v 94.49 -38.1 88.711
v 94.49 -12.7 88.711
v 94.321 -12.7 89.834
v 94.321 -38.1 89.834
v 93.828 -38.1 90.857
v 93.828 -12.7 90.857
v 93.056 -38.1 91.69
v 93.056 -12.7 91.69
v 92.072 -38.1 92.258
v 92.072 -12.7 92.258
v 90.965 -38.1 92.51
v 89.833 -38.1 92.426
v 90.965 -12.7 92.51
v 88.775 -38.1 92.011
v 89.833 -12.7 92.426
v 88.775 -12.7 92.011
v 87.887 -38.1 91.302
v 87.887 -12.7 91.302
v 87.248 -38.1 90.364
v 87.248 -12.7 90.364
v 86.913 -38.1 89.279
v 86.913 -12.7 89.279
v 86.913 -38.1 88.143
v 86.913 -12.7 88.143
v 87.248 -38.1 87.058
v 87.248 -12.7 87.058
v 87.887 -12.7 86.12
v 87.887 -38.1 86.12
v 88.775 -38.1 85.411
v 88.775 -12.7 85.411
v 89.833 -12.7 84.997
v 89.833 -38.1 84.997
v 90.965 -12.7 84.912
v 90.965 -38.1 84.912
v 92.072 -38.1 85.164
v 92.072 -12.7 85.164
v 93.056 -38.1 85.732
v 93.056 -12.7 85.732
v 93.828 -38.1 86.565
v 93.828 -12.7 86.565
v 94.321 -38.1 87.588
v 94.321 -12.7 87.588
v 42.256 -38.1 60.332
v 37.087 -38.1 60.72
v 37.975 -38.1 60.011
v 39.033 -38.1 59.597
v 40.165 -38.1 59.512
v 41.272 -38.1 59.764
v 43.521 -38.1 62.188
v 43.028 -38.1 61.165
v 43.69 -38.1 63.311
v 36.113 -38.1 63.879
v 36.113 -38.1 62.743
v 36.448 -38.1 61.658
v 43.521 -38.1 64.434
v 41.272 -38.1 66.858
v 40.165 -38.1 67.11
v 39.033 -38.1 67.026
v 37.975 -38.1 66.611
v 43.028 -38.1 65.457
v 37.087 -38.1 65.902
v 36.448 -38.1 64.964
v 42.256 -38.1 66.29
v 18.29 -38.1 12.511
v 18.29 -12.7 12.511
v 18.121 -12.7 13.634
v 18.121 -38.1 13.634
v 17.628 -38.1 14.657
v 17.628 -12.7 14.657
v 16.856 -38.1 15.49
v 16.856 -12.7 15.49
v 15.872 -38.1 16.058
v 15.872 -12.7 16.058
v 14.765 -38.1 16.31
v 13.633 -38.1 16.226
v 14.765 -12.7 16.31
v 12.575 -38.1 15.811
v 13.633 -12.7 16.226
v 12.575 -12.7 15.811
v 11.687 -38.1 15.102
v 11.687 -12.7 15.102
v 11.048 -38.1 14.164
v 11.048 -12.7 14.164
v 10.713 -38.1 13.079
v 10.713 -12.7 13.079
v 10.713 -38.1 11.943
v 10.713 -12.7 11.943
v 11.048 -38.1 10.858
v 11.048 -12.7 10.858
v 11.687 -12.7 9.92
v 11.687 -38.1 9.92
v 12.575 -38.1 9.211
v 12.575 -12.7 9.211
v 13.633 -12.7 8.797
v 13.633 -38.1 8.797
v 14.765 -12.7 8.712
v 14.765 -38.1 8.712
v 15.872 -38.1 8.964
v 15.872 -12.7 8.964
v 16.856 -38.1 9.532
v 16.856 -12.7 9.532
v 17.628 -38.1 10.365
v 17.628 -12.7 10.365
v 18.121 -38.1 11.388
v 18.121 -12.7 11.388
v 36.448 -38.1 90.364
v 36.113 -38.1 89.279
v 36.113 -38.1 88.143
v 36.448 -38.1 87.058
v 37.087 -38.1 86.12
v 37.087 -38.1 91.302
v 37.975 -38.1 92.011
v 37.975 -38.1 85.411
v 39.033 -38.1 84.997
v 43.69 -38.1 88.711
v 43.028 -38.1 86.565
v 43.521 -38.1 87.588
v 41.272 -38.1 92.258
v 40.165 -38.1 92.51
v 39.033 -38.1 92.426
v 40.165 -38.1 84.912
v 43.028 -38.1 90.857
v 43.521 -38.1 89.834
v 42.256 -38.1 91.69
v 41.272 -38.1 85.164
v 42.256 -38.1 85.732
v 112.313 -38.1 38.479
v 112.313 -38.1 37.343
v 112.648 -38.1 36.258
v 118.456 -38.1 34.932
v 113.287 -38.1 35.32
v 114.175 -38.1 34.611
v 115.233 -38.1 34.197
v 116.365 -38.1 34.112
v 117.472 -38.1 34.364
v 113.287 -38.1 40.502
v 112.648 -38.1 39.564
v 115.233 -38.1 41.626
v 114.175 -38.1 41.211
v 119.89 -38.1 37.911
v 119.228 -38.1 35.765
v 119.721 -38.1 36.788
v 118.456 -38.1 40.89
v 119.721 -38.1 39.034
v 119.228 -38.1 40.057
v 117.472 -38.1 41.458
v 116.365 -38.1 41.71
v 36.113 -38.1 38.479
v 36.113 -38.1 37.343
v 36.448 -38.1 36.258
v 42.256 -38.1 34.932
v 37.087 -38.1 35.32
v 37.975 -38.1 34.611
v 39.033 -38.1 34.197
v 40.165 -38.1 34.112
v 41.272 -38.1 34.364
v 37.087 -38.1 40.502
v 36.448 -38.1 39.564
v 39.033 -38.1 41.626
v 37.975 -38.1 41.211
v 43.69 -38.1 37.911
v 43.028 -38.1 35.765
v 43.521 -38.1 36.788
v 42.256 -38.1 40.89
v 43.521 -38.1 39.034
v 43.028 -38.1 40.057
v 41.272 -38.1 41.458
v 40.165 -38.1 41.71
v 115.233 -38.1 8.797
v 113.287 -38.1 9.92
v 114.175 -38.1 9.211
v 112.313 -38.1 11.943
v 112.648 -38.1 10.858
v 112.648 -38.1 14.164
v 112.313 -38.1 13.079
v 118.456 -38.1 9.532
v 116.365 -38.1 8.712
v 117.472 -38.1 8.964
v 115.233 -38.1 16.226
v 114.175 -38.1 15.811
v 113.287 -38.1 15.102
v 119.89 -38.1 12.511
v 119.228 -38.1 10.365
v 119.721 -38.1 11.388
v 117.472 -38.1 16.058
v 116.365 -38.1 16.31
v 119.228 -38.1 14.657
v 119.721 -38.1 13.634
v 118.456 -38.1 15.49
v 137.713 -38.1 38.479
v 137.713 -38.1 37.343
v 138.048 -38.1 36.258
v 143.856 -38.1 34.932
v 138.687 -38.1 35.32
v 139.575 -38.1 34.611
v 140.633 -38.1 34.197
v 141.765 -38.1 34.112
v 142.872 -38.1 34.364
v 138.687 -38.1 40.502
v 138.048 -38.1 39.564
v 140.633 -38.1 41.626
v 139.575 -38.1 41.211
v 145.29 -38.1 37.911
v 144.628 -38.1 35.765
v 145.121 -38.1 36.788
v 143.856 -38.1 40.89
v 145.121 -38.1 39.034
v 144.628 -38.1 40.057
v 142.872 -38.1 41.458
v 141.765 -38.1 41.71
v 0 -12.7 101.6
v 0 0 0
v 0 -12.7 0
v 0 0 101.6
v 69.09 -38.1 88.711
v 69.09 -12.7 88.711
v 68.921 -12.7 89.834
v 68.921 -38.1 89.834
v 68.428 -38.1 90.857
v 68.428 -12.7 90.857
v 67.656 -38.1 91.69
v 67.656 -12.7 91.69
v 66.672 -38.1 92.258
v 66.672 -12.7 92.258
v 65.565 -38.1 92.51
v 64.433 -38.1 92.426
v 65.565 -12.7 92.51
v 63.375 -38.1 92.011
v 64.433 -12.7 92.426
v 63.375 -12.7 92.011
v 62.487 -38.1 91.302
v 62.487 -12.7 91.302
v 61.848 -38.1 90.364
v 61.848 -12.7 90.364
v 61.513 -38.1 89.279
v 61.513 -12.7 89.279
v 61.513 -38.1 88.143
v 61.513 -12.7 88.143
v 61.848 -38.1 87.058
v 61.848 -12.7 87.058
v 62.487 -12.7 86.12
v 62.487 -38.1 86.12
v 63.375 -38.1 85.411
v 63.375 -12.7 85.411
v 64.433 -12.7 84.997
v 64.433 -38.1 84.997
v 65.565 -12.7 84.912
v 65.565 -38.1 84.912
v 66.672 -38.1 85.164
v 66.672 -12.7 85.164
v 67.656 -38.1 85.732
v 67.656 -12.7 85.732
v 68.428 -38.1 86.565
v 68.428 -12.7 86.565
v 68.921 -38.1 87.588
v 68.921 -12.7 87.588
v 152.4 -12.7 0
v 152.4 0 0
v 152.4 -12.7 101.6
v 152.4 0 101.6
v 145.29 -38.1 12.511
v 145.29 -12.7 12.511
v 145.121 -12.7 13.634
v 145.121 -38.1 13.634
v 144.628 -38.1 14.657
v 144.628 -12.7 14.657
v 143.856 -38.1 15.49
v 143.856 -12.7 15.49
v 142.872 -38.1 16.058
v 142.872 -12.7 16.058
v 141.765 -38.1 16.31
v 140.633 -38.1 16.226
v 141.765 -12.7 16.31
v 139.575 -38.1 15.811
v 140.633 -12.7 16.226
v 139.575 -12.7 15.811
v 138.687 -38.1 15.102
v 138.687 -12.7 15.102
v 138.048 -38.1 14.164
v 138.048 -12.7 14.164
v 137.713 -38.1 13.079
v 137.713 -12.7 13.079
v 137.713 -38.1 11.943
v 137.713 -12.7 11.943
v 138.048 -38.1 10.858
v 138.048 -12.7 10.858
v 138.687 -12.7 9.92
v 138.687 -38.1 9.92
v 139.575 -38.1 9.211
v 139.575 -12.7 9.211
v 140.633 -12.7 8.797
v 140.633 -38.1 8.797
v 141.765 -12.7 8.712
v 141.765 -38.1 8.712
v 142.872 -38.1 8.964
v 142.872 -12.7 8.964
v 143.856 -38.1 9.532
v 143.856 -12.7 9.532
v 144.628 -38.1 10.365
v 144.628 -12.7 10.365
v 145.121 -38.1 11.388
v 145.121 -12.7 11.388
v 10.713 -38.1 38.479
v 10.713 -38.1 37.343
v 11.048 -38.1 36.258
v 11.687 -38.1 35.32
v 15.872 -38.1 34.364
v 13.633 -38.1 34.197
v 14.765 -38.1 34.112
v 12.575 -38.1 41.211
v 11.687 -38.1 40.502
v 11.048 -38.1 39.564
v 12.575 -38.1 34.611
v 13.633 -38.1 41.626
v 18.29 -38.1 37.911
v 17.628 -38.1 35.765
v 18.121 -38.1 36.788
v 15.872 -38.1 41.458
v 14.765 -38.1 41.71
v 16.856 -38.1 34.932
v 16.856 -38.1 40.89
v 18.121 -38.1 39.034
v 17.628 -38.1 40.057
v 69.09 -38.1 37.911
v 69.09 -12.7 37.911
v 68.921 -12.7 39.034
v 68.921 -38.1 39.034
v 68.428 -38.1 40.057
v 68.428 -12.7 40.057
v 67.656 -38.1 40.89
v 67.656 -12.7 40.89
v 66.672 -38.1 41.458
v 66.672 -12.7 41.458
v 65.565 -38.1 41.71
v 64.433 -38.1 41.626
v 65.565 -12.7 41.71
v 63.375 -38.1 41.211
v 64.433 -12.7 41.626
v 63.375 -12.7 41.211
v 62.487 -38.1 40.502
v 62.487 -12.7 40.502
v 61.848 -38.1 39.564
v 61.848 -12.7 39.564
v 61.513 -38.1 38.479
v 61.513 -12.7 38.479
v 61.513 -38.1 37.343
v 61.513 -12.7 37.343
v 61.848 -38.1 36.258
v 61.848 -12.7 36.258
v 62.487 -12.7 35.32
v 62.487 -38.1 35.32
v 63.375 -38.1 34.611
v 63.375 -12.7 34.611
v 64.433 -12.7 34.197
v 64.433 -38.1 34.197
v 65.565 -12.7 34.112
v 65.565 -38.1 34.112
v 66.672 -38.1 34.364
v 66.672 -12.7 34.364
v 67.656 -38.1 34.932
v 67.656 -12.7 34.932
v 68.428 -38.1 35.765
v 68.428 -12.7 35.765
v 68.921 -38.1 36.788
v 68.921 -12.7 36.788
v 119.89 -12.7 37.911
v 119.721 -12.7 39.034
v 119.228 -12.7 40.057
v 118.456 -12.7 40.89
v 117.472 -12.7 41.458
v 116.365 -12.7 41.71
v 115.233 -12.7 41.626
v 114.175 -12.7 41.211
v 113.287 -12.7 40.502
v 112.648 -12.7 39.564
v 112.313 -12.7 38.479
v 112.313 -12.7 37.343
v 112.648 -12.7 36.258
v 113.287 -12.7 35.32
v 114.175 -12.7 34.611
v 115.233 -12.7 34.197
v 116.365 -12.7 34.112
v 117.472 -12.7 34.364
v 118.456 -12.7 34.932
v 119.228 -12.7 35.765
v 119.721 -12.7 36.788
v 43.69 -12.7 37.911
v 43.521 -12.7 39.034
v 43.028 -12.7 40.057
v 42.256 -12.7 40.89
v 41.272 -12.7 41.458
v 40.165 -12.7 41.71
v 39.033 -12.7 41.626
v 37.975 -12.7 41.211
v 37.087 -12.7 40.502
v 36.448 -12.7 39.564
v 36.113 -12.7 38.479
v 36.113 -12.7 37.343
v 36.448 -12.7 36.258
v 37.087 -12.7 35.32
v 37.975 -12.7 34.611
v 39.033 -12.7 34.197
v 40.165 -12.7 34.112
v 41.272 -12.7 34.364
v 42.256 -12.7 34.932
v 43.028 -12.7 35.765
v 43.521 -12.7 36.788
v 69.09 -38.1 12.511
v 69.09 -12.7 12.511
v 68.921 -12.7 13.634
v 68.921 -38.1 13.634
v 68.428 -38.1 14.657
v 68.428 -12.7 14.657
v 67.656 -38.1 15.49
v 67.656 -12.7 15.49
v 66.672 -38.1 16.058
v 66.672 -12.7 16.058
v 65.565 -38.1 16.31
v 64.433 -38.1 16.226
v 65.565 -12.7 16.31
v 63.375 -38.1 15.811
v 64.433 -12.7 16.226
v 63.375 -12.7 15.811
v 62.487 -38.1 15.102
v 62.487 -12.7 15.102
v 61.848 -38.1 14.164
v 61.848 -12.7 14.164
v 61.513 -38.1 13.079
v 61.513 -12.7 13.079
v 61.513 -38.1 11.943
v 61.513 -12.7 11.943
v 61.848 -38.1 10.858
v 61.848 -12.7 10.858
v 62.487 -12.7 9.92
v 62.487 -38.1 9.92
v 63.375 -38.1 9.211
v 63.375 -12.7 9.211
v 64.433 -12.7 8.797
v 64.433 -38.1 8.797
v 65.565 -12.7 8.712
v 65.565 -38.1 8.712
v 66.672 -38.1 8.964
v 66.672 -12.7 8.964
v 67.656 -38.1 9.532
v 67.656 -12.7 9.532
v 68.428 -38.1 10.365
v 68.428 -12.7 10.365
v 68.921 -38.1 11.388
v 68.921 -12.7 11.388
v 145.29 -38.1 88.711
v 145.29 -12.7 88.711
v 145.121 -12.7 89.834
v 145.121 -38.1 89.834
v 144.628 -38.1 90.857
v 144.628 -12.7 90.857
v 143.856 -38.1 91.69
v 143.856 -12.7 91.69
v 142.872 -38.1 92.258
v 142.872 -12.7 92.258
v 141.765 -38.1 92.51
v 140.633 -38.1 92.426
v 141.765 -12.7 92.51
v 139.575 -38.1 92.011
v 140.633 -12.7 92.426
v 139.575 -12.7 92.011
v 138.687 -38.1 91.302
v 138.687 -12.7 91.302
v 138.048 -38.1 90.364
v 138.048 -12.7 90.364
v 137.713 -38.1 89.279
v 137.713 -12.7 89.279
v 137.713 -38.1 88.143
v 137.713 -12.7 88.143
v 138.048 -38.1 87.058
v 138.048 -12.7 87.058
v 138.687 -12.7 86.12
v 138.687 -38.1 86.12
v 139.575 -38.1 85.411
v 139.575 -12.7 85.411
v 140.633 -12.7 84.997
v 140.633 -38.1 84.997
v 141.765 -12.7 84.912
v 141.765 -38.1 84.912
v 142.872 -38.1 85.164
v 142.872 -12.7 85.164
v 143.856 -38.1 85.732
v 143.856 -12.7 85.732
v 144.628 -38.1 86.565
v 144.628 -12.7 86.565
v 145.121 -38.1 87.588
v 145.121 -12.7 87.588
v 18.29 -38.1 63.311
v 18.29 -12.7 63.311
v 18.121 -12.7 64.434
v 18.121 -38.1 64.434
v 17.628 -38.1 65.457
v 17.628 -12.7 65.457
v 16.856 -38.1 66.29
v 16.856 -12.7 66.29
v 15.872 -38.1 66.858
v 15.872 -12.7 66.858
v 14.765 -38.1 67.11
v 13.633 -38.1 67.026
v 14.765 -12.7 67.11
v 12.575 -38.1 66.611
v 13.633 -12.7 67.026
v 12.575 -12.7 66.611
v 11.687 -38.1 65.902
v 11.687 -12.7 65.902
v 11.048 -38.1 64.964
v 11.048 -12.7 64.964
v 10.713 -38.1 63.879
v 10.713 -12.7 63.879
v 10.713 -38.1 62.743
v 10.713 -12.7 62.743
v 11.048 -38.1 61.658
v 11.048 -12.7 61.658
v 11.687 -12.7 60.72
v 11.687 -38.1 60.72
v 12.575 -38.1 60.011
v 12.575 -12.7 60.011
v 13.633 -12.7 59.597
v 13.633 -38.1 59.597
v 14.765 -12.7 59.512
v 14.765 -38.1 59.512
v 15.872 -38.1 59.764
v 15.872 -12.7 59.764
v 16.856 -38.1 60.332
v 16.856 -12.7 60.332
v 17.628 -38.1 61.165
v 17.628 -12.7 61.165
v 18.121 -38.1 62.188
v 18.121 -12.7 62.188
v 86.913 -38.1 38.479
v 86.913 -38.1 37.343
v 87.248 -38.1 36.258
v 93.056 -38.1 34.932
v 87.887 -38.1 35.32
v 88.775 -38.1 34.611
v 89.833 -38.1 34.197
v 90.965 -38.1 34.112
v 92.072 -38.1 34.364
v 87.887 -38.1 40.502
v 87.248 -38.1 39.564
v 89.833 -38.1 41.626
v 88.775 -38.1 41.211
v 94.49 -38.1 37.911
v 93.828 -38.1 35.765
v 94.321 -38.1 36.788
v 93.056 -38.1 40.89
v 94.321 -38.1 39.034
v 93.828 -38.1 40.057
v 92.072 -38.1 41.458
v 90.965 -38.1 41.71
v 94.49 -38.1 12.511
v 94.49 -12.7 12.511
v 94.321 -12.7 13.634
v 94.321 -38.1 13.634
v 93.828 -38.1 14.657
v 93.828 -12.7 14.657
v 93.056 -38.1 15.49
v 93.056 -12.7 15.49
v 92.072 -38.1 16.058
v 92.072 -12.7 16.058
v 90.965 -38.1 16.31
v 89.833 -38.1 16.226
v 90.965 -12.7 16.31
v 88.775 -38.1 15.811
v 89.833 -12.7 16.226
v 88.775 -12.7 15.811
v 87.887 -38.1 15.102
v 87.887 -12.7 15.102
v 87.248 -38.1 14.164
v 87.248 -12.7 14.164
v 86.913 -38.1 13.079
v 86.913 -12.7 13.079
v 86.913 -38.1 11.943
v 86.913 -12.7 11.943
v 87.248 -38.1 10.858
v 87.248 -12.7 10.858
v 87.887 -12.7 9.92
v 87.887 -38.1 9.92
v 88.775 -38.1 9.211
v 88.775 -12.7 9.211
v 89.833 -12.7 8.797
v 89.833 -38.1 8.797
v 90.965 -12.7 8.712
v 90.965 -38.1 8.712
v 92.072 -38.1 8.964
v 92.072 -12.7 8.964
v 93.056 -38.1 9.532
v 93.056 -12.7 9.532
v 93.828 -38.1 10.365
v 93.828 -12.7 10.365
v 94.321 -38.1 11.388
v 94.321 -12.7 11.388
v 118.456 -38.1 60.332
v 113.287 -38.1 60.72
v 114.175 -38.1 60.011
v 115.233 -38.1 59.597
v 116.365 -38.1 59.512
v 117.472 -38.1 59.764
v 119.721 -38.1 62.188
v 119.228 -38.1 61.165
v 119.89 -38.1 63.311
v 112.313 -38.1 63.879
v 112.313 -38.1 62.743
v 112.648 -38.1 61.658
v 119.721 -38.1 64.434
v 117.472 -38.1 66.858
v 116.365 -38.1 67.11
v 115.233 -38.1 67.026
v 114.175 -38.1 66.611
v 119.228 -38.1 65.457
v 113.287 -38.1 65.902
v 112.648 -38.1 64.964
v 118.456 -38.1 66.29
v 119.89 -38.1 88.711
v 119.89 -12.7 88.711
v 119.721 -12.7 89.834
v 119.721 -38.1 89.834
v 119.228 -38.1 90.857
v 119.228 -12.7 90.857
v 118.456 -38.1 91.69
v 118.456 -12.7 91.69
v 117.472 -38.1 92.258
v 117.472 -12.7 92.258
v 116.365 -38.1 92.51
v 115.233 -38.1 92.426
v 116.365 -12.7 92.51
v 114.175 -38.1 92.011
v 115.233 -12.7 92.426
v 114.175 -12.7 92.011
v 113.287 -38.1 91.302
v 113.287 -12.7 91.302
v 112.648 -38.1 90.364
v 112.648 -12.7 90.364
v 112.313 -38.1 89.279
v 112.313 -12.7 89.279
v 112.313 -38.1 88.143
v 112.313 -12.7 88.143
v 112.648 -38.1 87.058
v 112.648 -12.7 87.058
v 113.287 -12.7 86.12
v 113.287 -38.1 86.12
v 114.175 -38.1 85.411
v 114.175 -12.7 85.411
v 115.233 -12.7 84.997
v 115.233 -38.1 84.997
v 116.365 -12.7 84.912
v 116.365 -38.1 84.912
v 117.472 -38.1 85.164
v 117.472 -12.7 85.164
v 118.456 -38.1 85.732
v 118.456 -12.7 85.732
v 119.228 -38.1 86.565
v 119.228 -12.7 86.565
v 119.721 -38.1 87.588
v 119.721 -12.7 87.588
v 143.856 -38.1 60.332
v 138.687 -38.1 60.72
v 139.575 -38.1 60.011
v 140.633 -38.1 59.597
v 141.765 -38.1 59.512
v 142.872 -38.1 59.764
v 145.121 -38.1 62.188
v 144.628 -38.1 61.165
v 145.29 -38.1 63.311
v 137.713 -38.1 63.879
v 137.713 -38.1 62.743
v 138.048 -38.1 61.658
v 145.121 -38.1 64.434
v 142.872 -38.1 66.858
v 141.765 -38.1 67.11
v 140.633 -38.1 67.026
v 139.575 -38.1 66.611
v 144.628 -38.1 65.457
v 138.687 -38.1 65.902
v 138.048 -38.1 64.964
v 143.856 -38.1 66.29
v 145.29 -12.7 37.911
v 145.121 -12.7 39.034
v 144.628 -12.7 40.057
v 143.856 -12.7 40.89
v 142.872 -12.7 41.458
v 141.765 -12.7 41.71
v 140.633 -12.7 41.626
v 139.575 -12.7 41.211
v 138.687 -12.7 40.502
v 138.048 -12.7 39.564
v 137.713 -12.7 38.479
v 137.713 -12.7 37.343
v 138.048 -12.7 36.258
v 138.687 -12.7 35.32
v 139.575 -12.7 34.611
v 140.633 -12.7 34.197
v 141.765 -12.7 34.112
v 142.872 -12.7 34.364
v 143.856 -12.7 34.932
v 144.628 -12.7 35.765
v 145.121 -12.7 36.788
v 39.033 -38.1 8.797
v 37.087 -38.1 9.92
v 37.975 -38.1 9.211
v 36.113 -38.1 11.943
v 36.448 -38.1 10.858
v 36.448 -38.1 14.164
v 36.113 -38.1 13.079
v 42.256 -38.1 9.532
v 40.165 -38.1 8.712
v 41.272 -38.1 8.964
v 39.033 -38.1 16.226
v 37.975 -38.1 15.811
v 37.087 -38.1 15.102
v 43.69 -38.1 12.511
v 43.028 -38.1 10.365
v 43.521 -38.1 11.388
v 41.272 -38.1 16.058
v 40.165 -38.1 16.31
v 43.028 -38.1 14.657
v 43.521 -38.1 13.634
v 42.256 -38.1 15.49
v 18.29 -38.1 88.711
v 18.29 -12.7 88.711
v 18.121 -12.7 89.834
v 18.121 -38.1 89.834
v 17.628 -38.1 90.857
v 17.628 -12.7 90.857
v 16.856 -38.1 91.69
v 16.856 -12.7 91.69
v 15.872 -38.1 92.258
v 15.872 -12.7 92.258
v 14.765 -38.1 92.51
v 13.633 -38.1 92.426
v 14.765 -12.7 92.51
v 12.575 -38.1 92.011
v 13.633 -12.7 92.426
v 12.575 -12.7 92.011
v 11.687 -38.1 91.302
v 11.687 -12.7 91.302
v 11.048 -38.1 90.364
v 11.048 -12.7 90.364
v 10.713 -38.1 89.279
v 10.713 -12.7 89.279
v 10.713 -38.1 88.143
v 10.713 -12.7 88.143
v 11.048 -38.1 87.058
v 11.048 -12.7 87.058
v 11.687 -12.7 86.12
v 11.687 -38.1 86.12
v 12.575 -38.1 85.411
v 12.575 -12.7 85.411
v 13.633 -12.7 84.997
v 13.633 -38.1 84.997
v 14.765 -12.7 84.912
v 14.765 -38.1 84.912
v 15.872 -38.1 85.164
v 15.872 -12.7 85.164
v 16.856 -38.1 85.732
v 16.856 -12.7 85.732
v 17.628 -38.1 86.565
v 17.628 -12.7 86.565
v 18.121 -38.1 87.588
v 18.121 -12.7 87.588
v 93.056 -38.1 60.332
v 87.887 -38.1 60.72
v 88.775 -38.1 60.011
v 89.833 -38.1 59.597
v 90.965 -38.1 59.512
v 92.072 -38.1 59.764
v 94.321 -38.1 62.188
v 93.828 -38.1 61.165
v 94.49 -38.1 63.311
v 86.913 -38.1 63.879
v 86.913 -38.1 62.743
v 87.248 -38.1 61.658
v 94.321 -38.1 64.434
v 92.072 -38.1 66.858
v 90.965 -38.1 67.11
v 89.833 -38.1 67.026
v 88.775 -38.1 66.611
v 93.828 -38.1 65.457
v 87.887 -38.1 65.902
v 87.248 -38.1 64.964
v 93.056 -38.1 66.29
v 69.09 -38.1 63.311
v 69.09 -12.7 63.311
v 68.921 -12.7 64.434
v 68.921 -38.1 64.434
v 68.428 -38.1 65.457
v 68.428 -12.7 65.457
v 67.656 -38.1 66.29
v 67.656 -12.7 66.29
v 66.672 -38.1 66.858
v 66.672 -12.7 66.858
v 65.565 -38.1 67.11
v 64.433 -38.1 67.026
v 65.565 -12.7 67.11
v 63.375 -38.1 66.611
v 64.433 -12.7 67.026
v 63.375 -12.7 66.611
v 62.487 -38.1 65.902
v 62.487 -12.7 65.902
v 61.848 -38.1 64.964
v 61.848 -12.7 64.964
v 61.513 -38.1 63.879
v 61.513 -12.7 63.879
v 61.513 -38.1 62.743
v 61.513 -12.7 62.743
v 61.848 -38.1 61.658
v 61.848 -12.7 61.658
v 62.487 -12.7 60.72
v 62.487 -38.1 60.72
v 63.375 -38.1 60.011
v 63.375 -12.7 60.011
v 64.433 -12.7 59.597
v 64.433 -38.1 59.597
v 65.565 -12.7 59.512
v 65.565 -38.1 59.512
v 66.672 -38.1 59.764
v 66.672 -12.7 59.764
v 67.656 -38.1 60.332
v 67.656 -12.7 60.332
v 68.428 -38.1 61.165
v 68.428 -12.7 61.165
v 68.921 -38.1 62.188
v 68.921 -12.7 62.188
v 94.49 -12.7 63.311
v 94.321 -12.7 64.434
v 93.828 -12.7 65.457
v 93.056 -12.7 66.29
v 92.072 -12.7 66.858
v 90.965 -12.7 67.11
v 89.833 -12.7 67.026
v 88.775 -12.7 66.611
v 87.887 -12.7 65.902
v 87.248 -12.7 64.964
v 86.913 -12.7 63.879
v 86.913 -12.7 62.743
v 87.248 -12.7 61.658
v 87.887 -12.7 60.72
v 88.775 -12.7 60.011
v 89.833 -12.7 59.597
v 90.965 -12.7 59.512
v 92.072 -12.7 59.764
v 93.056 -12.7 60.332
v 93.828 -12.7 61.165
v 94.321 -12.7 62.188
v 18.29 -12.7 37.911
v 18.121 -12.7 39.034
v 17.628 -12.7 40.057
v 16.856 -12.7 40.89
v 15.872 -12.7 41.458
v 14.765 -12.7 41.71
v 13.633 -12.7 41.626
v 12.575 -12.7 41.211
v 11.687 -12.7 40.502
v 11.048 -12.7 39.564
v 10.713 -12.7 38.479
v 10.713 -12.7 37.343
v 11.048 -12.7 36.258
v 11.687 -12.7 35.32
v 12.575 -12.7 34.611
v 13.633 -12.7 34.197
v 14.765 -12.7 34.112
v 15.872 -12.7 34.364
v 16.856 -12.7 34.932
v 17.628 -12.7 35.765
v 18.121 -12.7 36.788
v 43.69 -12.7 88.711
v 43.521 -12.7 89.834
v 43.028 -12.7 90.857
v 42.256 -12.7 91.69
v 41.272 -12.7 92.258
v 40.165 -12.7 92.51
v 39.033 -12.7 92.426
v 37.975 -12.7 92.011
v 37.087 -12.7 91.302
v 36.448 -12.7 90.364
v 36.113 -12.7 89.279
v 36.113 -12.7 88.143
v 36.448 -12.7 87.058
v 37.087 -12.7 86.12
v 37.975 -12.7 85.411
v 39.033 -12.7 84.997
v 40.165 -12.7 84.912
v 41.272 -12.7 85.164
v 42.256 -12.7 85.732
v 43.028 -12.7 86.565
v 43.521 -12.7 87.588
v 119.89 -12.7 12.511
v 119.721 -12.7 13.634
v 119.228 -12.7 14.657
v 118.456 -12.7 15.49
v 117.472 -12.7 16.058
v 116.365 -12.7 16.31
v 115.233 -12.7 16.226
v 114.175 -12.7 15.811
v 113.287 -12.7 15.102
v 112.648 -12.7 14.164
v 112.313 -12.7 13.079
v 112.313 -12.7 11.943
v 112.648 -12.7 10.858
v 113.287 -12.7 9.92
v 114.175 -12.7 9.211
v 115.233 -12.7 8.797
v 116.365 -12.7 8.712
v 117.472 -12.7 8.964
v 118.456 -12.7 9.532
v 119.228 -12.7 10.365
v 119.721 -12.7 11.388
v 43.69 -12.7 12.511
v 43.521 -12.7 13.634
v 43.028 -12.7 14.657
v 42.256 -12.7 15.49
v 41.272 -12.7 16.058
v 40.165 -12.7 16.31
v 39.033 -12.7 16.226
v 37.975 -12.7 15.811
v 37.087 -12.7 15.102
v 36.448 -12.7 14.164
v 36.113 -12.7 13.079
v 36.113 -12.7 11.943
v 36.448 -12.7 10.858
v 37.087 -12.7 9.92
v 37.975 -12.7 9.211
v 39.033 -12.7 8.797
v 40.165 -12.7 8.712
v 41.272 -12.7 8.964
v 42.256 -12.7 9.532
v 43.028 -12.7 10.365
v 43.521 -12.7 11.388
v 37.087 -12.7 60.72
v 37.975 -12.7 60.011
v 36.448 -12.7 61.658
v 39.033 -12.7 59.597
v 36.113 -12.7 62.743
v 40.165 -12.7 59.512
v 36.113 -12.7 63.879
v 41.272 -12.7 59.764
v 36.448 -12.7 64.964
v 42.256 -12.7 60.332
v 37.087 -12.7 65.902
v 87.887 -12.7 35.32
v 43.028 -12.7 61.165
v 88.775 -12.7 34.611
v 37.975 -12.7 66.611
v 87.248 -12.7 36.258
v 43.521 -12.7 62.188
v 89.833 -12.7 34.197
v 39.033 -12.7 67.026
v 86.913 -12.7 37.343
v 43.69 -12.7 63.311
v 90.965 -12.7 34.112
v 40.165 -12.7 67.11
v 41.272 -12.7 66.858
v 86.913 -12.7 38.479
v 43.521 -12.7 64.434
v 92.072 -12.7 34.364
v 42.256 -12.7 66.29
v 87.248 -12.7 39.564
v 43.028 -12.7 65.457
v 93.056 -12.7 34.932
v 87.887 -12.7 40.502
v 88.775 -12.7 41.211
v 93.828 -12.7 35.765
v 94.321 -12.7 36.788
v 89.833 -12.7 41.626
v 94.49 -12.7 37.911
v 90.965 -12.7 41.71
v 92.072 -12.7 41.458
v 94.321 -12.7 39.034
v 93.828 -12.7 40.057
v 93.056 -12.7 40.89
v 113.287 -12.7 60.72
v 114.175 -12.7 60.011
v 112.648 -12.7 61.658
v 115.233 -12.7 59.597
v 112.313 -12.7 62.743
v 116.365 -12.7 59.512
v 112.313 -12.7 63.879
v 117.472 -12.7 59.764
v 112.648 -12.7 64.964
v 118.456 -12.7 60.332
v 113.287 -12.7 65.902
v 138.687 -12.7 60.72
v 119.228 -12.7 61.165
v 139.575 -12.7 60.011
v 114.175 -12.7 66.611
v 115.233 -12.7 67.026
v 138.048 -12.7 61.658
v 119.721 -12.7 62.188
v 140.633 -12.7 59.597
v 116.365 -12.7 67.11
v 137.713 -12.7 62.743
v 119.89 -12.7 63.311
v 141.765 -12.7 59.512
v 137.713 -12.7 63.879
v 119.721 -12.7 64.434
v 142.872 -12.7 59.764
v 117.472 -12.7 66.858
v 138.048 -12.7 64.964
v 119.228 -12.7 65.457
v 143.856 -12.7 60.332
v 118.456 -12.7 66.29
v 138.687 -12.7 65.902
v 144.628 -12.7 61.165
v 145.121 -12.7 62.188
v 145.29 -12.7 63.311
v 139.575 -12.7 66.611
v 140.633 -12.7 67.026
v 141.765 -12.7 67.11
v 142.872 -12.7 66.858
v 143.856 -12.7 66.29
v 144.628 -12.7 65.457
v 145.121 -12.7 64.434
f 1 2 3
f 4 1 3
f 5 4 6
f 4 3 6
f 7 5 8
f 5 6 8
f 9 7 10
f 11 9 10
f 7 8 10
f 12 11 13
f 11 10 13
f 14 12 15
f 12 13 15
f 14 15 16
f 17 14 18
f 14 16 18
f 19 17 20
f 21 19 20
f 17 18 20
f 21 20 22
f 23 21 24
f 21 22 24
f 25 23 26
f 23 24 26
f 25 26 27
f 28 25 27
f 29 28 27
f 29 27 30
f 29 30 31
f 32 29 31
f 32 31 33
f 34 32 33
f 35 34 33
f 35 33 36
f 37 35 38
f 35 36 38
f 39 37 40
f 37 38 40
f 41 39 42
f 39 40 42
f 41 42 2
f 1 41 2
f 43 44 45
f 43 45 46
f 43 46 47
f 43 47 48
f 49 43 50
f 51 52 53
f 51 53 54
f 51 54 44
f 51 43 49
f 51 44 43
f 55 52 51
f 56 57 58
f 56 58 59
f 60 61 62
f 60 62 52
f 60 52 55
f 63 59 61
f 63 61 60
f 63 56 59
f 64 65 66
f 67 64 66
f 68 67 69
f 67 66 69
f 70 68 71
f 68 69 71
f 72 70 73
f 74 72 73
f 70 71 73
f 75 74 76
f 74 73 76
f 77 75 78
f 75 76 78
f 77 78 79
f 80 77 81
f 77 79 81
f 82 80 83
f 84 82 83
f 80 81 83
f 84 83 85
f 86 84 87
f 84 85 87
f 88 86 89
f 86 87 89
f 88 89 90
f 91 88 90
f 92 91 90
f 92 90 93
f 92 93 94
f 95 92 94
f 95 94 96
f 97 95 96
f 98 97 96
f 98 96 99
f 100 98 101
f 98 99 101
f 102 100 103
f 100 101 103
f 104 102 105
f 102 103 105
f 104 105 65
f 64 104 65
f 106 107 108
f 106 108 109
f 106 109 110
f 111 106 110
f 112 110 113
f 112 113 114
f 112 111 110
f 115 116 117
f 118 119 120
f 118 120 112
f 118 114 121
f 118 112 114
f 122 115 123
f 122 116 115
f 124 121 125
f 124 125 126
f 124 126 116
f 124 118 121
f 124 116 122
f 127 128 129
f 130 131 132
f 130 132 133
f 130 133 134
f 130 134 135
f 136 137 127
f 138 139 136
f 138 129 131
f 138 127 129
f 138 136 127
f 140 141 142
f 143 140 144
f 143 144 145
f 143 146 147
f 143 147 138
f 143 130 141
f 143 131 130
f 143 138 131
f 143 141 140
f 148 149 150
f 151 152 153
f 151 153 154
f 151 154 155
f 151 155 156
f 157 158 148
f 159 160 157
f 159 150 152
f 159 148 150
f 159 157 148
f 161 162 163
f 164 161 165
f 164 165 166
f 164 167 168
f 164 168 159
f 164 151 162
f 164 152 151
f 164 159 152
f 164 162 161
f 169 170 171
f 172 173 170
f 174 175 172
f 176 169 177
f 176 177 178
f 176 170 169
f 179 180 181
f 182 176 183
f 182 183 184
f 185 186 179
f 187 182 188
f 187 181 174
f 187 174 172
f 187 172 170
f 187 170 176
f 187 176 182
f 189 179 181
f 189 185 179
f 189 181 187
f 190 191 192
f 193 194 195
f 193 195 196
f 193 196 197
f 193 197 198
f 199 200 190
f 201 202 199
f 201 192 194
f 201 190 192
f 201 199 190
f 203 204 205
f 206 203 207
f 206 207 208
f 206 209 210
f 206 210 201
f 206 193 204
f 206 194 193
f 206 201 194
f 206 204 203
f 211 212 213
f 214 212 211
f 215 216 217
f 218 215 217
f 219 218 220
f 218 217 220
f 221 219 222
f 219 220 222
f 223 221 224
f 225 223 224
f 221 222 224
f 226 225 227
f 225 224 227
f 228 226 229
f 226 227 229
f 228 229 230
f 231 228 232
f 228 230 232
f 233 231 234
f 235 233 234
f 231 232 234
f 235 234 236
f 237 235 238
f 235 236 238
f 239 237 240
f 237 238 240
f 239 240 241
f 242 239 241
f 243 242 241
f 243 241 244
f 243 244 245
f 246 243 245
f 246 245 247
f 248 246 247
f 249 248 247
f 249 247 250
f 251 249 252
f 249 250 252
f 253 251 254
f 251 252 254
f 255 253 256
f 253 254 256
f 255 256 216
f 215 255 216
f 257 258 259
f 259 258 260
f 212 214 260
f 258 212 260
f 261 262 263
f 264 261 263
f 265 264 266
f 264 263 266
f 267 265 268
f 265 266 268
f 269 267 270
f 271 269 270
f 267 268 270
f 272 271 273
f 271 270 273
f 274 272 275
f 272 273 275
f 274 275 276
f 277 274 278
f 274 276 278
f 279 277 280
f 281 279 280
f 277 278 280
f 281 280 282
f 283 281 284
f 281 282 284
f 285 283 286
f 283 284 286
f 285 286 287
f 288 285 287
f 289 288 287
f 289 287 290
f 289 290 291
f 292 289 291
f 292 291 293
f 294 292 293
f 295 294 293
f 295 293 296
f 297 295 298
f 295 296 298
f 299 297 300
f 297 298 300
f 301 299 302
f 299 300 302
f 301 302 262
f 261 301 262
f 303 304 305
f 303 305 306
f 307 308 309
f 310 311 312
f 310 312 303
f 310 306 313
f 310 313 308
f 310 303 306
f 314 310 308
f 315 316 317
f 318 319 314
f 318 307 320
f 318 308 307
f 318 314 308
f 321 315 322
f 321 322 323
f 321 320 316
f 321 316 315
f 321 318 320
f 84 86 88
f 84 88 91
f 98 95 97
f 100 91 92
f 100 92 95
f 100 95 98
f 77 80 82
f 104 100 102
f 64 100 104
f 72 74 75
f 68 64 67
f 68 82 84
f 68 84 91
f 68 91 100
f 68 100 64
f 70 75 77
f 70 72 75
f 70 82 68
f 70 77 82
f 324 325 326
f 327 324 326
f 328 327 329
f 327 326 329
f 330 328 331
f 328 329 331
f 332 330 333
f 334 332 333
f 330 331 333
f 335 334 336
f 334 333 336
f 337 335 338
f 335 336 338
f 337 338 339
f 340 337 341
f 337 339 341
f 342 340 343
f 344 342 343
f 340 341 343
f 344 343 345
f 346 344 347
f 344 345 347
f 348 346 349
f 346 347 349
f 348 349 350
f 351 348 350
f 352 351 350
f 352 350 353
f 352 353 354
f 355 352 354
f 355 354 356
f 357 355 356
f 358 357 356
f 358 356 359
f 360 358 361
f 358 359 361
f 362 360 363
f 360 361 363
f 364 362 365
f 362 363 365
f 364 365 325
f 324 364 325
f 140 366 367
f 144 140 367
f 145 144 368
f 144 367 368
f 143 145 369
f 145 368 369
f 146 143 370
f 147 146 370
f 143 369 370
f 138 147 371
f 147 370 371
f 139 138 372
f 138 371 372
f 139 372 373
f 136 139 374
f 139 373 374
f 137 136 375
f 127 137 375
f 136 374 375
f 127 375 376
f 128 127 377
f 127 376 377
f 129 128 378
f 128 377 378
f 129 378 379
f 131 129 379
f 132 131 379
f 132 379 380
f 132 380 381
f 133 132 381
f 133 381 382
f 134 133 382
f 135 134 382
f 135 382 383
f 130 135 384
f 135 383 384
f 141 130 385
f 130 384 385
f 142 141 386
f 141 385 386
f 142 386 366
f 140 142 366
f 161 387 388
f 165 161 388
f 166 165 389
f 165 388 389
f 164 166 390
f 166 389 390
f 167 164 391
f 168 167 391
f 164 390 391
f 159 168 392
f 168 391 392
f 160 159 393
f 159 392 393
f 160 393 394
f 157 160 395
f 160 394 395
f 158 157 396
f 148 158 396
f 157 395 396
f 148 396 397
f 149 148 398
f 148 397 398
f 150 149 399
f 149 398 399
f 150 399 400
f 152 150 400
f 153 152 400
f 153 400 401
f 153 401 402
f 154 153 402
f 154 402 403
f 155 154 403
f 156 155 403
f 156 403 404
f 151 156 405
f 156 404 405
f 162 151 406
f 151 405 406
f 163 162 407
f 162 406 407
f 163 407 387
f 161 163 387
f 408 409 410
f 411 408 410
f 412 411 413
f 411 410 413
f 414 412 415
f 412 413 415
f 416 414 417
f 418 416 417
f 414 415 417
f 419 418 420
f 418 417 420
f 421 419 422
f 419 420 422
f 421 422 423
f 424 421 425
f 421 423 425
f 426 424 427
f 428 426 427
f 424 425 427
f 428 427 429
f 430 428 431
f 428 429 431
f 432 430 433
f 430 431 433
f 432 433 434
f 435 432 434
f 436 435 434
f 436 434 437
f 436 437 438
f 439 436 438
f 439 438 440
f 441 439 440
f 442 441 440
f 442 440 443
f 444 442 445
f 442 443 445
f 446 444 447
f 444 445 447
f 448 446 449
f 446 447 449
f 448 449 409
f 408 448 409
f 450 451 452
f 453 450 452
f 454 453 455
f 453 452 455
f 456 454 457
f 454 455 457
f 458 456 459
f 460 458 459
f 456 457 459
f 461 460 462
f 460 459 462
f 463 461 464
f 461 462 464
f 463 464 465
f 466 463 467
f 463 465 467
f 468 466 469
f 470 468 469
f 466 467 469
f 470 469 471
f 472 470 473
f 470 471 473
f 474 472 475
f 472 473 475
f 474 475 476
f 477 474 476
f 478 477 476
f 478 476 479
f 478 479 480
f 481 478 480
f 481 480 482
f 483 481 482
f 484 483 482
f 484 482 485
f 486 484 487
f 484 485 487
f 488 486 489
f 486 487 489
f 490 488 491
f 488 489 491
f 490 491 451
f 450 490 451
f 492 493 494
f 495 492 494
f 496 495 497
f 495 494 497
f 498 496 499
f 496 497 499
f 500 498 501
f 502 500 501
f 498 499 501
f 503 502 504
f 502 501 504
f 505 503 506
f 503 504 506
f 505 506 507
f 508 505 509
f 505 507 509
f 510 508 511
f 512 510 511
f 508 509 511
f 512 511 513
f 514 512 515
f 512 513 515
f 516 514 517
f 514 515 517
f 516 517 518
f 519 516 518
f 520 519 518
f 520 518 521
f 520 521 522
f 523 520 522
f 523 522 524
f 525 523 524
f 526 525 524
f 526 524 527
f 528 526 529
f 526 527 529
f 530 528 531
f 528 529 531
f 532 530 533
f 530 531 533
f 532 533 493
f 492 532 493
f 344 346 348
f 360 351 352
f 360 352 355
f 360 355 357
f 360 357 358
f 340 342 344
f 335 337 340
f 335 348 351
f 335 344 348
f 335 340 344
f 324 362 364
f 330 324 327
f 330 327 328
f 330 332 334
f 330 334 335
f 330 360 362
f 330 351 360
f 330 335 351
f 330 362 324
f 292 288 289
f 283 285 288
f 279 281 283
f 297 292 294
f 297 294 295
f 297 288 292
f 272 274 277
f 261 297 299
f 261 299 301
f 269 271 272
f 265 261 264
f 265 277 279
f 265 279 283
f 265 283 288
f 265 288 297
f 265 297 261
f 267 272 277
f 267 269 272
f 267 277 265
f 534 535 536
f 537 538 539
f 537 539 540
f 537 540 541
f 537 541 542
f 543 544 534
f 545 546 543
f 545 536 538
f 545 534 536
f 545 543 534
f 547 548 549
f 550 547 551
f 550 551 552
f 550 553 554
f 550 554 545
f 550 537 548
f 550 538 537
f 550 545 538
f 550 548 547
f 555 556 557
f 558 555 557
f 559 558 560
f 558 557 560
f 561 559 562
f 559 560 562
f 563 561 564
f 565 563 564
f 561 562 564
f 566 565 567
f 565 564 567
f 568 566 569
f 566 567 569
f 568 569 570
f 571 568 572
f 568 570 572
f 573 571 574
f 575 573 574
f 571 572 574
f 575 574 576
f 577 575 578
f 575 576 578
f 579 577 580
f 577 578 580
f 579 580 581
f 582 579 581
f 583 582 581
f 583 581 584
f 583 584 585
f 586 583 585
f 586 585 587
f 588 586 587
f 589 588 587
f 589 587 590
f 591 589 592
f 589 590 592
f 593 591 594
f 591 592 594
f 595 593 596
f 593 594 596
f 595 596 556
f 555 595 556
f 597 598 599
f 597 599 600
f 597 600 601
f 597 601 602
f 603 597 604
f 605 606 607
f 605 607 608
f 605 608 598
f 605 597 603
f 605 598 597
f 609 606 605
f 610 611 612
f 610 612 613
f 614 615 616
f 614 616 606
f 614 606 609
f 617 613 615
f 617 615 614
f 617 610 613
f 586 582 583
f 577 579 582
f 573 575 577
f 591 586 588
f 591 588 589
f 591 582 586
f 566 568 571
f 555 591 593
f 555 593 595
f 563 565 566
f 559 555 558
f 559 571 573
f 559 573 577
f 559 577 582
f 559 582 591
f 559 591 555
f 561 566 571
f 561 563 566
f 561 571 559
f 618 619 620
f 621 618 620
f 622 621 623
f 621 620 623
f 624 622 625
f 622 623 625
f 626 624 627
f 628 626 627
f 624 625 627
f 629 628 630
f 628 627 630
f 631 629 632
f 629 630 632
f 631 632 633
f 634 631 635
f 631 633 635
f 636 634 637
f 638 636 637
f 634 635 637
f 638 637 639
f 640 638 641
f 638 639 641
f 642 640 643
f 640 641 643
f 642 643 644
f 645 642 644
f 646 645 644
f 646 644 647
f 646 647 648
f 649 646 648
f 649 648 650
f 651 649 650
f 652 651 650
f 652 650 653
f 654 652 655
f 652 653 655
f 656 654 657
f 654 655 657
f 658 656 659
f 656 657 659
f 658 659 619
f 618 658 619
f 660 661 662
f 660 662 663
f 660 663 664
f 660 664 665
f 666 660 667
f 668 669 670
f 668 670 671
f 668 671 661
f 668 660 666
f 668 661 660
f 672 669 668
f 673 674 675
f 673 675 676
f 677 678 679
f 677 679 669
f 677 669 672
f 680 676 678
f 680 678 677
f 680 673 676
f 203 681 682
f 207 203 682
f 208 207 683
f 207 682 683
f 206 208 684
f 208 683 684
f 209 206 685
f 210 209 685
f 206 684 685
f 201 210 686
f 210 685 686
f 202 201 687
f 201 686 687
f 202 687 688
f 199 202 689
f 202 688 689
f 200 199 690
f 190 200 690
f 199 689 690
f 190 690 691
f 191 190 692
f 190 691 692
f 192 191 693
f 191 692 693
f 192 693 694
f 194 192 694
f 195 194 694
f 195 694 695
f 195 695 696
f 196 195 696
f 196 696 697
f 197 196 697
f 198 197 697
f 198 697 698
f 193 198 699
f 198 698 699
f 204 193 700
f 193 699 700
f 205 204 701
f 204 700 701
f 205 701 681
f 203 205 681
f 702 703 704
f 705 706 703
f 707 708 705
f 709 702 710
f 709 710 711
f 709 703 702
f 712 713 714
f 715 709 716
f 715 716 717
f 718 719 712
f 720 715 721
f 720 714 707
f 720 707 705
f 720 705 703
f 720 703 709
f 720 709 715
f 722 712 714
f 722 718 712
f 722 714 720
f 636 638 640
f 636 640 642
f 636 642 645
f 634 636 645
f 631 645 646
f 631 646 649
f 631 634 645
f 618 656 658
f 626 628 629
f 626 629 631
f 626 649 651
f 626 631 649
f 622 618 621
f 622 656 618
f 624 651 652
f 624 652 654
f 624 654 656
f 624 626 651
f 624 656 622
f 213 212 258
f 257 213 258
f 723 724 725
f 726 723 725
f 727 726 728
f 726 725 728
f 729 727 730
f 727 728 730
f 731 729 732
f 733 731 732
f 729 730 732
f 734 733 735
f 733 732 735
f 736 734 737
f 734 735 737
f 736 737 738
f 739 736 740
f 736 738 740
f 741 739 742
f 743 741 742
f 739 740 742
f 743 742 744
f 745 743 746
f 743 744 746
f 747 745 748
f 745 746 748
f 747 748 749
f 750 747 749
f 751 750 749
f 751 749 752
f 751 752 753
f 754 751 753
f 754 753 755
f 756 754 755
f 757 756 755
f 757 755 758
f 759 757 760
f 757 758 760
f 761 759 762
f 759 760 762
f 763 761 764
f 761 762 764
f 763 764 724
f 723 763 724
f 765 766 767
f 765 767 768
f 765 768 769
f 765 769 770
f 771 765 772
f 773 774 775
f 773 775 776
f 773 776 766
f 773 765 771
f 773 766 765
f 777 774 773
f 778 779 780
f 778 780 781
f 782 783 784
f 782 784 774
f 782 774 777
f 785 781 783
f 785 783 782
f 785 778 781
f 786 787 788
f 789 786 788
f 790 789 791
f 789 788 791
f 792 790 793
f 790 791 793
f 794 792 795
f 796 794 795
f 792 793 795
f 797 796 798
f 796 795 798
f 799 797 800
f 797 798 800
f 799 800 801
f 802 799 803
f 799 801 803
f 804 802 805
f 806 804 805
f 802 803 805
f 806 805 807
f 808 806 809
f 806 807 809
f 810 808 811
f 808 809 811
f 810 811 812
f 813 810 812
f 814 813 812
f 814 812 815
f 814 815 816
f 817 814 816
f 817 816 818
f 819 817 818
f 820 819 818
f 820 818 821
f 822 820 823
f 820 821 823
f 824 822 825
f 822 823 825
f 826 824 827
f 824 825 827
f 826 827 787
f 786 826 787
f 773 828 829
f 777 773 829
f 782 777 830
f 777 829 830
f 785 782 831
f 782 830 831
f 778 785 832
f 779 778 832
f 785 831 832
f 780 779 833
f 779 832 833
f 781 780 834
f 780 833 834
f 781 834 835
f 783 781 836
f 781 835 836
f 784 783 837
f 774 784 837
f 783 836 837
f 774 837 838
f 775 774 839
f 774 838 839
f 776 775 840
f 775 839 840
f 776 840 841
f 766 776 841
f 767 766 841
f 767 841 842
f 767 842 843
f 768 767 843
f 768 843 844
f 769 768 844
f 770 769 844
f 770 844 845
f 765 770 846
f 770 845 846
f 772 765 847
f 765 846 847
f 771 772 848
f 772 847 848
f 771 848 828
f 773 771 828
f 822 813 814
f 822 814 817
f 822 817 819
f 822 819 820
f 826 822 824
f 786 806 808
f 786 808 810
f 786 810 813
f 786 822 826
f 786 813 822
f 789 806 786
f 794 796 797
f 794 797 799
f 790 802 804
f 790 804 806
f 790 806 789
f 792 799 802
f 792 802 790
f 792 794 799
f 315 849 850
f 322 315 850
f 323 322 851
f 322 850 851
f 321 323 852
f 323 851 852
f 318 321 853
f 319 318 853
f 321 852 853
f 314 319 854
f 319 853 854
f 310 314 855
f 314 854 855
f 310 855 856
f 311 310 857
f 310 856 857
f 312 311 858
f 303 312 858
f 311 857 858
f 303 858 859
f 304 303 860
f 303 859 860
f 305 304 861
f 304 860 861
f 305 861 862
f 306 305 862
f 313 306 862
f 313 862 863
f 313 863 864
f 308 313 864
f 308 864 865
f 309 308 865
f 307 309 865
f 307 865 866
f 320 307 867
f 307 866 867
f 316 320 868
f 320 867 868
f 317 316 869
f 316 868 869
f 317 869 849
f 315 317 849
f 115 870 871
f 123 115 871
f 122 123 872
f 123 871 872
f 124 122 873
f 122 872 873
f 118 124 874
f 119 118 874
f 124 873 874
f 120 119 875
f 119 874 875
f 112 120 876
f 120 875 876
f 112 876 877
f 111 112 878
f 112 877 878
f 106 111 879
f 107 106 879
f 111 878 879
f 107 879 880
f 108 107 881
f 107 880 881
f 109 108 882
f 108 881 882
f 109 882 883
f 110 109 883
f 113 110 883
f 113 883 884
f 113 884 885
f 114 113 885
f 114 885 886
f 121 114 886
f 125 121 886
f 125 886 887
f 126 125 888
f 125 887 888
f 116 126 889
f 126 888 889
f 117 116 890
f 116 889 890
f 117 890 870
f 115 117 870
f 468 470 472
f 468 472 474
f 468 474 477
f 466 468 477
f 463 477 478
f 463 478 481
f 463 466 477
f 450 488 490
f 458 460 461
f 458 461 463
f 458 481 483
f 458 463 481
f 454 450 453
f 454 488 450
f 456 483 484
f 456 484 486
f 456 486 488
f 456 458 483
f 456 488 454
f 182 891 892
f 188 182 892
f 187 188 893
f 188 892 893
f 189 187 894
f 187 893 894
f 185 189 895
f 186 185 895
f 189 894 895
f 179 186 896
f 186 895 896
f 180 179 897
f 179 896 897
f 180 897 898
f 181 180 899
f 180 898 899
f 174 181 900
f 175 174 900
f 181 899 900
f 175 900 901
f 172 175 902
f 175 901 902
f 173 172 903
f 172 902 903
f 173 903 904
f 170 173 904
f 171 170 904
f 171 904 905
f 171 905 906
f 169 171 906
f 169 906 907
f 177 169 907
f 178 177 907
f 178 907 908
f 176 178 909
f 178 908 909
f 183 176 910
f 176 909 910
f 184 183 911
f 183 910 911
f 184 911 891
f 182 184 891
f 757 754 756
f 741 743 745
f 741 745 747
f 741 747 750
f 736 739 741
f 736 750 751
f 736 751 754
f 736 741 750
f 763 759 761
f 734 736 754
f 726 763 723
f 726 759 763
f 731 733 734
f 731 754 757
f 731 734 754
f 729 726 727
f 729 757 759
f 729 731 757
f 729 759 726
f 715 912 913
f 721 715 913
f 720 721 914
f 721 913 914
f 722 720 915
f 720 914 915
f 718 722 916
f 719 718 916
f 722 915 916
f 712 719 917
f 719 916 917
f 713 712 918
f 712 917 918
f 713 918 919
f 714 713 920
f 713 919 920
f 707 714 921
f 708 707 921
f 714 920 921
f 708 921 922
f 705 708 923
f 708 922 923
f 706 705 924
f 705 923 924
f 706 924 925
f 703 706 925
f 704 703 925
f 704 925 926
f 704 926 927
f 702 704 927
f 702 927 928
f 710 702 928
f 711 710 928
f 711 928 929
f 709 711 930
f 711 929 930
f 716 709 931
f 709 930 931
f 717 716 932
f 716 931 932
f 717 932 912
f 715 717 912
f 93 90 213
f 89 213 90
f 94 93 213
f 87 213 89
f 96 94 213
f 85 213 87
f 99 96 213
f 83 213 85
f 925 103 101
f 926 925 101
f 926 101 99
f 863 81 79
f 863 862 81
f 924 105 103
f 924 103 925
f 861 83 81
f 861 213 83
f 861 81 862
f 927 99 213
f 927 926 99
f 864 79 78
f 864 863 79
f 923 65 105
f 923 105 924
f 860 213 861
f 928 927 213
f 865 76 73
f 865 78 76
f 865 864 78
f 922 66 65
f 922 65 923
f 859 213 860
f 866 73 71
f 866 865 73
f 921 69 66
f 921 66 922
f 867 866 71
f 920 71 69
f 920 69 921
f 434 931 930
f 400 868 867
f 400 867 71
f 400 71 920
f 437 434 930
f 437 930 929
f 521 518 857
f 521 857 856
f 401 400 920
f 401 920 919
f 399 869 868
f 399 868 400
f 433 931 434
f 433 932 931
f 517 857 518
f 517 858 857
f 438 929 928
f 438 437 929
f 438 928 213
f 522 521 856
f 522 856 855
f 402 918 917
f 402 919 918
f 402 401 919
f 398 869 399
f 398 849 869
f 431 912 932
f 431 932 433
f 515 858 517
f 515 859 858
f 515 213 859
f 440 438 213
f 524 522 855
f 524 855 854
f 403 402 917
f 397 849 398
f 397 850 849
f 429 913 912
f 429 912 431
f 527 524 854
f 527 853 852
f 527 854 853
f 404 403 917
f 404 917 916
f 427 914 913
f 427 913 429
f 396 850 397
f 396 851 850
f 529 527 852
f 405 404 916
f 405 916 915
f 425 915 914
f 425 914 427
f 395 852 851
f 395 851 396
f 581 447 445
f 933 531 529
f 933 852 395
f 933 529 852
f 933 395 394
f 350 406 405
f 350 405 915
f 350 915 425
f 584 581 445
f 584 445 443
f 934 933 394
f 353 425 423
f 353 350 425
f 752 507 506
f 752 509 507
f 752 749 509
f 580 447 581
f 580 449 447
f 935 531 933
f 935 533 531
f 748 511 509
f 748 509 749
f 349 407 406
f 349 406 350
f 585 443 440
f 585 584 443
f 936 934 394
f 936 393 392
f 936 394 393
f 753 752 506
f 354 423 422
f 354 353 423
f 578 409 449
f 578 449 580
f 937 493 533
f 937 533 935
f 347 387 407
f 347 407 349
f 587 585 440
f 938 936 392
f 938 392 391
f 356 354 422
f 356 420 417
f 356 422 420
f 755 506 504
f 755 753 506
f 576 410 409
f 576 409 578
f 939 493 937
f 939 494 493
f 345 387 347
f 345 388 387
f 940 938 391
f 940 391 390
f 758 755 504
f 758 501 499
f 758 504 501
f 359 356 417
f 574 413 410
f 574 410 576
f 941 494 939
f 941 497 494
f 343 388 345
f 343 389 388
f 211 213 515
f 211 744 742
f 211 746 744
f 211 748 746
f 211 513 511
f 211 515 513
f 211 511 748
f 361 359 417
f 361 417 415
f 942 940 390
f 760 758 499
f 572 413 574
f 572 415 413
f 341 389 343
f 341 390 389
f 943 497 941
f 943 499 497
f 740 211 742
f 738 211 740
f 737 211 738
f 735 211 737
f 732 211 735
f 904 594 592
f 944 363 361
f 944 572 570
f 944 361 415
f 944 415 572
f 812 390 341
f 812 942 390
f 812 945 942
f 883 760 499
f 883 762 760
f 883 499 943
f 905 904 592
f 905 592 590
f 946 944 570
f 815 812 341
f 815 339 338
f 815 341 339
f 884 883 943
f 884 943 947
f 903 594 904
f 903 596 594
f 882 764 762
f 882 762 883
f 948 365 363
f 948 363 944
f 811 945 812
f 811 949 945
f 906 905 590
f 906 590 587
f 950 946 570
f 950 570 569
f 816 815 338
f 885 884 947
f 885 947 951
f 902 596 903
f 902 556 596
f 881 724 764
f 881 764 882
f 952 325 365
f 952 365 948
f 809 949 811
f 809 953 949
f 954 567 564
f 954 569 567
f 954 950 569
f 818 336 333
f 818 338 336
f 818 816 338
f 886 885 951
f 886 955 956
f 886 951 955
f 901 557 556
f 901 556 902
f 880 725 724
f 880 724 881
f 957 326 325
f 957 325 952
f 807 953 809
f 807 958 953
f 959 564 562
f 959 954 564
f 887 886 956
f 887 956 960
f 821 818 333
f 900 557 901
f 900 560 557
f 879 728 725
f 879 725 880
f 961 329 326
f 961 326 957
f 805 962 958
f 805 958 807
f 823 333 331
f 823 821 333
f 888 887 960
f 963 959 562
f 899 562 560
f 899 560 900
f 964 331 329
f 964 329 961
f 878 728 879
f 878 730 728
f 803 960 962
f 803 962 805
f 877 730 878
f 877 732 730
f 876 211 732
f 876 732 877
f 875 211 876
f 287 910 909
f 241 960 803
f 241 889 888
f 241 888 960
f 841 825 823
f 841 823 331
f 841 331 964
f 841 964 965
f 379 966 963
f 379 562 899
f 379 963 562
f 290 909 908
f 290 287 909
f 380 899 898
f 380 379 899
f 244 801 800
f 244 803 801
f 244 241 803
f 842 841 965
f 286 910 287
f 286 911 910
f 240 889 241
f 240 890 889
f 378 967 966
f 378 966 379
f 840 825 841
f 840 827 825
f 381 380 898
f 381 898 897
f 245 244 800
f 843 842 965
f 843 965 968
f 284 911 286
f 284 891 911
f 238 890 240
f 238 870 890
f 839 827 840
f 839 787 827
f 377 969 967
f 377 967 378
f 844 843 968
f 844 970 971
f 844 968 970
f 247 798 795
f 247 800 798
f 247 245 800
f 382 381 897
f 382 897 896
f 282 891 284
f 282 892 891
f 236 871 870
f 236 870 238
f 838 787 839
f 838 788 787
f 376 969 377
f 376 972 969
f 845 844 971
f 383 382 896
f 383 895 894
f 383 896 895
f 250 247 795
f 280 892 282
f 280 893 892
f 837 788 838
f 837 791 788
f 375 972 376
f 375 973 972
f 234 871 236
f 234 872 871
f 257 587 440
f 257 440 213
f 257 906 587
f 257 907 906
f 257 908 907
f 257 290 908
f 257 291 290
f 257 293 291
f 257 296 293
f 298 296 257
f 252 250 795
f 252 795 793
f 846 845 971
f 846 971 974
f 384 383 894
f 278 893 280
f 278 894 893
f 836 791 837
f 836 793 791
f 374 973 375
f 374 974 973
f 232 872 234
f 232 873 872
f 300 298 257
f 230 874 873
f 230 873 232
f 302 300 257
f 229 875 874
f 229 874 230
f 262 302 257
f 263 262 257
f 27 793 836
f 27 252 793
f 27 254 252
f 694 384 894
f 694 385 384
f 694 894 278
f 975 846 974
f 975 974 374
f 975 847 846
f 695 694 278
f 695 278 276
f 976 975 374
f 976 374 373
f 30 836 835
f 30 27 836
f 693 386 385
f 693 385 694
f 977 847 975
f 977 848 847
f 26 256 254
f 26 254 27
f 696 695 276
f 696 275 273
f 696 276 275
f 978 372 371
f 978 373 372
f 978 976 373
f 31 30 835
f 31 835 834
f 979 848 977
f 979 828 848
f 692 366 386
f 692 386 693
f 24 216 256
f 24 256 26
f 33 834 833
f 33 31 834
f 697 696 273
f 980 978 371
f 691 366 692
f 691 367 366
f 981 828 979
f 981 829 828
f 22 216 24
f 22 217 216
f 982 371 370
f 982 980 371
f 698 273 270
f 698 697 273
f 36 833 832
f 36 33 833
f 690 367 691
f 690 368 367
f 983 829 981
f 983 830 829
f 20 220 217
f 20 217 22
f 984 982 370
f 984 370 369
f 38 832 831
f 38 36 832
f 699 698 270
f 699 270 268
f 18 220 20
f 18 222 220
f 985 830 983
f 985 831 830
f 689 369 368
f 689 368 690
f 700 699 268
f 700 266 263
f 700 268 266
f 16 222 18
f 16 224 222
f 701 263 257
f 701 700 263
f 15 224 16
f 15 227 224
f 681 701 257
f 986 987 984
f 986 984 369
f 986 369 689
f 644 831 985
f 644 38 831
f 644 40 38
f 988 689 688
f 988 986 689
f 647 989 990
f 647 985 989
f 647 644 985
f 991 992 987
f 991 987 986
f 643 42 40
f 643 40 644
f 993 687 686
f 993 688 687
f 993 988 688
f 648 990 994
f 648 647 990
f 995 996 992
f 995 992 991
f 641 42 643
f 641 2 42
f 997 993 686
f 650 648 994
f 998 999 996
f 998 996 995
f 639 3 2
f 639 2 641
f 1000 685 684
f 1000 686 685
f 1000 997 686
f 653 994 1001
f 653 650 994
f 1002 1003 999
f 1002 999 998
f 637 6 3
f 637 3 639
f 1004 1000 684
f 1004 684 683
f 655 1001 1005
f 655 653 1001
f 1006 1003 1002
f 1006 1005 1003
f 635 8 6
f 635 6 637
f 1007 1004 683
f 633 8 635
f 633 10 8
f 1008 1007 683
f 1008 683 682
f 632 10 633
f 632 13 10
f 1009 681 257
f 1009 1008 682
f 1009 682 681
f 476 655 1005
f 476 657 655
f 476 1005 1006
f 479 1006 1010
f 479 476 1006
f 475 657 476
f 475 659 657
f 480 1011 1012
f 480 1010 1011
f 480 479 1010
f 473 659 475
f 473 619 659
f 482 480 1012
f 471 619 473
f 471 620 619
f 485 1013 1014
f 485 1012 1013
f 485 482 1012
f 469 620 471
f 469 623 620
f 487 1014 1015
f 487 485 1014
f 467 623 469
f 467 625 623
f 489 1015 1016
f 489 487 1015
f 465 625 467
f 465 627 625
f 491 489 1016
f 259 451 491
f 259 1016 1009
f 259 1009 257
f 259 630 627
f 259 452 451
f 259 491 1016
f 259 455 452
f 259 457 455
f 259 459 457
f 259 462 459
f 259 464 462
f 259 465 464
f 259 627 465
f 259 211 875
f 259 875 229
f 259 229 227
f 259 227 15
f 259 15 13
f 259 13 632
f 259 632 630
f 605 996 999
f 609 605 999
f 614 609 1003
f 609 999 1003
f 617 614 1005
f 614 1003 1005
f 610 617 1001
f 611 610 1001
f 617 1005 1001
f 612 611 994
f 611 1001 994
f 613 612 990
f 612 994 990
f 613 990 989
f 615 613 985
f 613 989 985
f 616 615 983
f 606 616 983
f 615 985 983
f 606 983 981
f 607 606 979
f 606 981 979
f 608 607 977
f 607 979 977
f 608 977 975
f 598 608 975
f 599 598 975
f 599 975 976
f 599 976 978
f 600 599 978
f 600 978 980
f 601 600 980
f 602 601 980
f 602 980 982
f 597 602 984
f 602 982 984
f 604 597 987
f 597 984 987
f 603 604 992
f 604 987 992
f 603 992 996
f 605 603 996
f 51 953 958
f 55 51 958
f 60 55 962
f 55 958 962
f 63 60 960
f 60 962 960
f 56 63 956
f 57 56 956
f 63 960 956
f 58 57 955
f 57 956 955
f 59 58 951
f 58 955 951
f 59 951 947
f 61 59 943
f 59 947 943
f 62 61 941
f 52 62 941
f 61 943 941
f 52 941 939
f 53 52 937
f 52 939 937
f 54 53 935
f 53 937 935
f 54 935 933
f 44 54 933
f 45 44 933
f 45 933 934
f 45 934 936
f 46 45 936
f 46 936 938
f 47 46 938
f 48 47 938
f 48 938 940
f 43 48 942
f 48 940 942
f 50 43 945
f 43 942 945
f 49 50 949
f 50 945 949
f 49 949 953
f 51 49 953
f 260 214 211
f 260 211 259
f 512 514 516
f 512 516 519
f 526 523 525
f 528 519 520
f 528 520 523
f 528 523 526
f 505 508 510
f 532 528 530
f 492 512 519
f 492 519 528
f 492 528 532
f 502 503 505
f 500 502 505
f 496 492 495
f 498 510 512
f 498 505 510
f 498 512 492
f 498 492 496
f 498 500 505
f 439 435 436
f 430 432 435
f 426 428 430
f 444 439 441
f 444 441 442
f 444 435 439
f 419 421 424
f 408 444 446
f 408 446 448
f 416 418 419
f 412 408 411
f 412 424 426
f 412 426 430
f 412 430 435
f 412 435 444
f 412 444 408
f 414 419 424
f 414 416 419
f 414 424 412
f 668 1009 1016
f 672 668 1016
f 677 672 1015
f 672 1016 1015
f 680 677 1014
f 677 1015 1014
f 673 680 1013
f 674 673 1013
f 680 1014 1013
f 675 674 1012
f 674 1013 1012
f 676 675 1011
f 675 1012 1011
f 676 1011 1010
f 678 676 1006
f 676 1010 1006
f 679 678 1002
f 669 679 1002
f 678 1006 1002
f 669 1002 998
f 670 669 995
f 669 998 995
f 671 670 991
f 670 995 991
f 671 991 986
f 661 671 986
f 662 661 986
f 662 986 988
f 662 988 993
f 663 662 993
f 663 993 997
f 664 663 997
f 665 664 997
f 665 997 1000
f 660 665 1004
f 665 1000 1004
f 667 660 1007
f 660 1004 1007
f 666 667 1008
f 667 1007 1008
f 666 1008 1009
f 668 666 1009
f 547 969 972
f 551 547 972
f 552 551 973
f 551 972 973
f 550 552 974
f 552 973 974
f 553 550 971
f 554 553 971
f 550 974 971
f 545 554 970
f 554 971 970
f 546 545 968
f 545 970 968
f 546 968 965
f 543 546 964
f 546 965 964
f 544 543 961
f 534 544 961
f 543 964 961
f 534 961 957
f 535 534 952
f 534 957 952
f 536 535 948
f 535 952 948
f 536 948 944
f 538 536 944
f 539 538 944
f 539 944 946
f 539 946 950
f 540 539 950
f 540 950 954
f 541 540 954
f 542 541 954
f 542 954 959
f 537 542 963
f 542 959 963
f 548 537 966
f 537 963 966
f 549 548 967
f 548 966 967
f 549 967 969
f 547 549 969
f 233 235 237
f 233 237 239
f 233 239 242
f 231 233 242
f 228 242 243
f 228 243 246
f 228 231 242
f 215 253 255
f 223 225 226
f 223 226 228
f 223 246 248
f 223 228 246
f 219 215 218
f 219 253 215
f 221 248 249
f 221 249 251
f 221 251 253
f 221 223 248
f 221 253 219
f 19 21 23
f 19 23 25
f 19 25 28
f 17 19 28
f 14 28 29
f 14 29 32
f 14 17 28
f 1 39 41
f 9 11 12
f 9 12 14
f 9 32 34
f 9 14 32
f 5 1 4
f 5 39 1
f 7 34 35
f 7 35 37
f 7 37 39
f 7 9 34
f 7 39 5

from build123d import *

# Parameters (mm, degrees)
F0_W     = 152.4
F0_H     = 101.6
F1_DEPTH = 12.7
F2_R     = 3.81
F3_DEPTH = 25.4


# Not quite as in the source:
# - a feature names something its author has since deleted; it is built from what else it names


with BuildPart() as f1:
    # F0 (on Front) → F1 (new body)
    with BuildSketch(Plane.XZ):
        with Locations((76.2, 50.8)):
            Rectangle(F0_W, F0_H)
    extrude(amount=F1_DEPTH)

    # F2 (on face) → F3 (join)
    with BuildSketch(Plane.XZ.offset(12.7)):
        with Locations((14.4803142175, 12.5110410154)):
            Circle(F2_R)
        with Locations((14.4803142175, 37.9110410154)):
            Circle(F2_R)
        with Locations((14.4803142175, 63.3110410154)):
            Circle(F2_R)
        with Locations((14.4803142175, 88.7110410154)):
            Circle(F2_R)
        with Locations((39.8803142175, 12.5110410154)):
            Circle(F2_R)
        with Locations((39.8803142175, 37.9110410154)):
            Circle(F2_R)
        with Locations((39.8803142175, 63.3110410154)):
            Circle(F2_R)
        with Locations((39.8803142175, 88.7110410154)):
            Circle(F2_R)
        with Locations((65.2803142175, 12.5110410154)):
            Circle(F2_R)
        with Locations((65.2803142175, 37.9110410154)):
            Circle(F2_R)
        with Locations((65.2803142175, 63.3110410154)):
            Circle(F2_R)
        with Locations((65.2803142175, 88.7110410154)):
            Circle(F2_R)
        with Locations((90.6803142175, 12.5110410154)):
            Circle(F2_R)
        with Locations((90.6803142175, 37.9110410154)):
            Circle(F2_R)
        with Locations((90.6803142175, 63.3110410154)):
            Circle(F2_R)
        with Locations((90.6803142175, 88.7110410154)):
            Circle(F2_R)
        with Locations((116.0803142175, 12.5110410154)):
            Circle(F2_R)
        with Locations((116.0803142175, 37.9110410154)):
            Circle(F2_R)
        with Locations((116.0803142175, 63.3110410154)):
            Circle(F2_R)
        with Locations((116.0803142175, 88.7110410154)):
            Circle(F2_R)
        with Locations((141.4803142175, 12.5110410154)):
            Circle(F2_R)
        with Locations((141.4803142175, 37.9110410154)):
            Circle(F2_R)
        with Locations((141.4803142175, 63.3110410154)):
            Circle(F2_R)
        with Locations((141.4803142175, 88.7110410154)):
            Circle(F2_R)
    extrude(amount=F3_DEPTH)


solid = f1.part
